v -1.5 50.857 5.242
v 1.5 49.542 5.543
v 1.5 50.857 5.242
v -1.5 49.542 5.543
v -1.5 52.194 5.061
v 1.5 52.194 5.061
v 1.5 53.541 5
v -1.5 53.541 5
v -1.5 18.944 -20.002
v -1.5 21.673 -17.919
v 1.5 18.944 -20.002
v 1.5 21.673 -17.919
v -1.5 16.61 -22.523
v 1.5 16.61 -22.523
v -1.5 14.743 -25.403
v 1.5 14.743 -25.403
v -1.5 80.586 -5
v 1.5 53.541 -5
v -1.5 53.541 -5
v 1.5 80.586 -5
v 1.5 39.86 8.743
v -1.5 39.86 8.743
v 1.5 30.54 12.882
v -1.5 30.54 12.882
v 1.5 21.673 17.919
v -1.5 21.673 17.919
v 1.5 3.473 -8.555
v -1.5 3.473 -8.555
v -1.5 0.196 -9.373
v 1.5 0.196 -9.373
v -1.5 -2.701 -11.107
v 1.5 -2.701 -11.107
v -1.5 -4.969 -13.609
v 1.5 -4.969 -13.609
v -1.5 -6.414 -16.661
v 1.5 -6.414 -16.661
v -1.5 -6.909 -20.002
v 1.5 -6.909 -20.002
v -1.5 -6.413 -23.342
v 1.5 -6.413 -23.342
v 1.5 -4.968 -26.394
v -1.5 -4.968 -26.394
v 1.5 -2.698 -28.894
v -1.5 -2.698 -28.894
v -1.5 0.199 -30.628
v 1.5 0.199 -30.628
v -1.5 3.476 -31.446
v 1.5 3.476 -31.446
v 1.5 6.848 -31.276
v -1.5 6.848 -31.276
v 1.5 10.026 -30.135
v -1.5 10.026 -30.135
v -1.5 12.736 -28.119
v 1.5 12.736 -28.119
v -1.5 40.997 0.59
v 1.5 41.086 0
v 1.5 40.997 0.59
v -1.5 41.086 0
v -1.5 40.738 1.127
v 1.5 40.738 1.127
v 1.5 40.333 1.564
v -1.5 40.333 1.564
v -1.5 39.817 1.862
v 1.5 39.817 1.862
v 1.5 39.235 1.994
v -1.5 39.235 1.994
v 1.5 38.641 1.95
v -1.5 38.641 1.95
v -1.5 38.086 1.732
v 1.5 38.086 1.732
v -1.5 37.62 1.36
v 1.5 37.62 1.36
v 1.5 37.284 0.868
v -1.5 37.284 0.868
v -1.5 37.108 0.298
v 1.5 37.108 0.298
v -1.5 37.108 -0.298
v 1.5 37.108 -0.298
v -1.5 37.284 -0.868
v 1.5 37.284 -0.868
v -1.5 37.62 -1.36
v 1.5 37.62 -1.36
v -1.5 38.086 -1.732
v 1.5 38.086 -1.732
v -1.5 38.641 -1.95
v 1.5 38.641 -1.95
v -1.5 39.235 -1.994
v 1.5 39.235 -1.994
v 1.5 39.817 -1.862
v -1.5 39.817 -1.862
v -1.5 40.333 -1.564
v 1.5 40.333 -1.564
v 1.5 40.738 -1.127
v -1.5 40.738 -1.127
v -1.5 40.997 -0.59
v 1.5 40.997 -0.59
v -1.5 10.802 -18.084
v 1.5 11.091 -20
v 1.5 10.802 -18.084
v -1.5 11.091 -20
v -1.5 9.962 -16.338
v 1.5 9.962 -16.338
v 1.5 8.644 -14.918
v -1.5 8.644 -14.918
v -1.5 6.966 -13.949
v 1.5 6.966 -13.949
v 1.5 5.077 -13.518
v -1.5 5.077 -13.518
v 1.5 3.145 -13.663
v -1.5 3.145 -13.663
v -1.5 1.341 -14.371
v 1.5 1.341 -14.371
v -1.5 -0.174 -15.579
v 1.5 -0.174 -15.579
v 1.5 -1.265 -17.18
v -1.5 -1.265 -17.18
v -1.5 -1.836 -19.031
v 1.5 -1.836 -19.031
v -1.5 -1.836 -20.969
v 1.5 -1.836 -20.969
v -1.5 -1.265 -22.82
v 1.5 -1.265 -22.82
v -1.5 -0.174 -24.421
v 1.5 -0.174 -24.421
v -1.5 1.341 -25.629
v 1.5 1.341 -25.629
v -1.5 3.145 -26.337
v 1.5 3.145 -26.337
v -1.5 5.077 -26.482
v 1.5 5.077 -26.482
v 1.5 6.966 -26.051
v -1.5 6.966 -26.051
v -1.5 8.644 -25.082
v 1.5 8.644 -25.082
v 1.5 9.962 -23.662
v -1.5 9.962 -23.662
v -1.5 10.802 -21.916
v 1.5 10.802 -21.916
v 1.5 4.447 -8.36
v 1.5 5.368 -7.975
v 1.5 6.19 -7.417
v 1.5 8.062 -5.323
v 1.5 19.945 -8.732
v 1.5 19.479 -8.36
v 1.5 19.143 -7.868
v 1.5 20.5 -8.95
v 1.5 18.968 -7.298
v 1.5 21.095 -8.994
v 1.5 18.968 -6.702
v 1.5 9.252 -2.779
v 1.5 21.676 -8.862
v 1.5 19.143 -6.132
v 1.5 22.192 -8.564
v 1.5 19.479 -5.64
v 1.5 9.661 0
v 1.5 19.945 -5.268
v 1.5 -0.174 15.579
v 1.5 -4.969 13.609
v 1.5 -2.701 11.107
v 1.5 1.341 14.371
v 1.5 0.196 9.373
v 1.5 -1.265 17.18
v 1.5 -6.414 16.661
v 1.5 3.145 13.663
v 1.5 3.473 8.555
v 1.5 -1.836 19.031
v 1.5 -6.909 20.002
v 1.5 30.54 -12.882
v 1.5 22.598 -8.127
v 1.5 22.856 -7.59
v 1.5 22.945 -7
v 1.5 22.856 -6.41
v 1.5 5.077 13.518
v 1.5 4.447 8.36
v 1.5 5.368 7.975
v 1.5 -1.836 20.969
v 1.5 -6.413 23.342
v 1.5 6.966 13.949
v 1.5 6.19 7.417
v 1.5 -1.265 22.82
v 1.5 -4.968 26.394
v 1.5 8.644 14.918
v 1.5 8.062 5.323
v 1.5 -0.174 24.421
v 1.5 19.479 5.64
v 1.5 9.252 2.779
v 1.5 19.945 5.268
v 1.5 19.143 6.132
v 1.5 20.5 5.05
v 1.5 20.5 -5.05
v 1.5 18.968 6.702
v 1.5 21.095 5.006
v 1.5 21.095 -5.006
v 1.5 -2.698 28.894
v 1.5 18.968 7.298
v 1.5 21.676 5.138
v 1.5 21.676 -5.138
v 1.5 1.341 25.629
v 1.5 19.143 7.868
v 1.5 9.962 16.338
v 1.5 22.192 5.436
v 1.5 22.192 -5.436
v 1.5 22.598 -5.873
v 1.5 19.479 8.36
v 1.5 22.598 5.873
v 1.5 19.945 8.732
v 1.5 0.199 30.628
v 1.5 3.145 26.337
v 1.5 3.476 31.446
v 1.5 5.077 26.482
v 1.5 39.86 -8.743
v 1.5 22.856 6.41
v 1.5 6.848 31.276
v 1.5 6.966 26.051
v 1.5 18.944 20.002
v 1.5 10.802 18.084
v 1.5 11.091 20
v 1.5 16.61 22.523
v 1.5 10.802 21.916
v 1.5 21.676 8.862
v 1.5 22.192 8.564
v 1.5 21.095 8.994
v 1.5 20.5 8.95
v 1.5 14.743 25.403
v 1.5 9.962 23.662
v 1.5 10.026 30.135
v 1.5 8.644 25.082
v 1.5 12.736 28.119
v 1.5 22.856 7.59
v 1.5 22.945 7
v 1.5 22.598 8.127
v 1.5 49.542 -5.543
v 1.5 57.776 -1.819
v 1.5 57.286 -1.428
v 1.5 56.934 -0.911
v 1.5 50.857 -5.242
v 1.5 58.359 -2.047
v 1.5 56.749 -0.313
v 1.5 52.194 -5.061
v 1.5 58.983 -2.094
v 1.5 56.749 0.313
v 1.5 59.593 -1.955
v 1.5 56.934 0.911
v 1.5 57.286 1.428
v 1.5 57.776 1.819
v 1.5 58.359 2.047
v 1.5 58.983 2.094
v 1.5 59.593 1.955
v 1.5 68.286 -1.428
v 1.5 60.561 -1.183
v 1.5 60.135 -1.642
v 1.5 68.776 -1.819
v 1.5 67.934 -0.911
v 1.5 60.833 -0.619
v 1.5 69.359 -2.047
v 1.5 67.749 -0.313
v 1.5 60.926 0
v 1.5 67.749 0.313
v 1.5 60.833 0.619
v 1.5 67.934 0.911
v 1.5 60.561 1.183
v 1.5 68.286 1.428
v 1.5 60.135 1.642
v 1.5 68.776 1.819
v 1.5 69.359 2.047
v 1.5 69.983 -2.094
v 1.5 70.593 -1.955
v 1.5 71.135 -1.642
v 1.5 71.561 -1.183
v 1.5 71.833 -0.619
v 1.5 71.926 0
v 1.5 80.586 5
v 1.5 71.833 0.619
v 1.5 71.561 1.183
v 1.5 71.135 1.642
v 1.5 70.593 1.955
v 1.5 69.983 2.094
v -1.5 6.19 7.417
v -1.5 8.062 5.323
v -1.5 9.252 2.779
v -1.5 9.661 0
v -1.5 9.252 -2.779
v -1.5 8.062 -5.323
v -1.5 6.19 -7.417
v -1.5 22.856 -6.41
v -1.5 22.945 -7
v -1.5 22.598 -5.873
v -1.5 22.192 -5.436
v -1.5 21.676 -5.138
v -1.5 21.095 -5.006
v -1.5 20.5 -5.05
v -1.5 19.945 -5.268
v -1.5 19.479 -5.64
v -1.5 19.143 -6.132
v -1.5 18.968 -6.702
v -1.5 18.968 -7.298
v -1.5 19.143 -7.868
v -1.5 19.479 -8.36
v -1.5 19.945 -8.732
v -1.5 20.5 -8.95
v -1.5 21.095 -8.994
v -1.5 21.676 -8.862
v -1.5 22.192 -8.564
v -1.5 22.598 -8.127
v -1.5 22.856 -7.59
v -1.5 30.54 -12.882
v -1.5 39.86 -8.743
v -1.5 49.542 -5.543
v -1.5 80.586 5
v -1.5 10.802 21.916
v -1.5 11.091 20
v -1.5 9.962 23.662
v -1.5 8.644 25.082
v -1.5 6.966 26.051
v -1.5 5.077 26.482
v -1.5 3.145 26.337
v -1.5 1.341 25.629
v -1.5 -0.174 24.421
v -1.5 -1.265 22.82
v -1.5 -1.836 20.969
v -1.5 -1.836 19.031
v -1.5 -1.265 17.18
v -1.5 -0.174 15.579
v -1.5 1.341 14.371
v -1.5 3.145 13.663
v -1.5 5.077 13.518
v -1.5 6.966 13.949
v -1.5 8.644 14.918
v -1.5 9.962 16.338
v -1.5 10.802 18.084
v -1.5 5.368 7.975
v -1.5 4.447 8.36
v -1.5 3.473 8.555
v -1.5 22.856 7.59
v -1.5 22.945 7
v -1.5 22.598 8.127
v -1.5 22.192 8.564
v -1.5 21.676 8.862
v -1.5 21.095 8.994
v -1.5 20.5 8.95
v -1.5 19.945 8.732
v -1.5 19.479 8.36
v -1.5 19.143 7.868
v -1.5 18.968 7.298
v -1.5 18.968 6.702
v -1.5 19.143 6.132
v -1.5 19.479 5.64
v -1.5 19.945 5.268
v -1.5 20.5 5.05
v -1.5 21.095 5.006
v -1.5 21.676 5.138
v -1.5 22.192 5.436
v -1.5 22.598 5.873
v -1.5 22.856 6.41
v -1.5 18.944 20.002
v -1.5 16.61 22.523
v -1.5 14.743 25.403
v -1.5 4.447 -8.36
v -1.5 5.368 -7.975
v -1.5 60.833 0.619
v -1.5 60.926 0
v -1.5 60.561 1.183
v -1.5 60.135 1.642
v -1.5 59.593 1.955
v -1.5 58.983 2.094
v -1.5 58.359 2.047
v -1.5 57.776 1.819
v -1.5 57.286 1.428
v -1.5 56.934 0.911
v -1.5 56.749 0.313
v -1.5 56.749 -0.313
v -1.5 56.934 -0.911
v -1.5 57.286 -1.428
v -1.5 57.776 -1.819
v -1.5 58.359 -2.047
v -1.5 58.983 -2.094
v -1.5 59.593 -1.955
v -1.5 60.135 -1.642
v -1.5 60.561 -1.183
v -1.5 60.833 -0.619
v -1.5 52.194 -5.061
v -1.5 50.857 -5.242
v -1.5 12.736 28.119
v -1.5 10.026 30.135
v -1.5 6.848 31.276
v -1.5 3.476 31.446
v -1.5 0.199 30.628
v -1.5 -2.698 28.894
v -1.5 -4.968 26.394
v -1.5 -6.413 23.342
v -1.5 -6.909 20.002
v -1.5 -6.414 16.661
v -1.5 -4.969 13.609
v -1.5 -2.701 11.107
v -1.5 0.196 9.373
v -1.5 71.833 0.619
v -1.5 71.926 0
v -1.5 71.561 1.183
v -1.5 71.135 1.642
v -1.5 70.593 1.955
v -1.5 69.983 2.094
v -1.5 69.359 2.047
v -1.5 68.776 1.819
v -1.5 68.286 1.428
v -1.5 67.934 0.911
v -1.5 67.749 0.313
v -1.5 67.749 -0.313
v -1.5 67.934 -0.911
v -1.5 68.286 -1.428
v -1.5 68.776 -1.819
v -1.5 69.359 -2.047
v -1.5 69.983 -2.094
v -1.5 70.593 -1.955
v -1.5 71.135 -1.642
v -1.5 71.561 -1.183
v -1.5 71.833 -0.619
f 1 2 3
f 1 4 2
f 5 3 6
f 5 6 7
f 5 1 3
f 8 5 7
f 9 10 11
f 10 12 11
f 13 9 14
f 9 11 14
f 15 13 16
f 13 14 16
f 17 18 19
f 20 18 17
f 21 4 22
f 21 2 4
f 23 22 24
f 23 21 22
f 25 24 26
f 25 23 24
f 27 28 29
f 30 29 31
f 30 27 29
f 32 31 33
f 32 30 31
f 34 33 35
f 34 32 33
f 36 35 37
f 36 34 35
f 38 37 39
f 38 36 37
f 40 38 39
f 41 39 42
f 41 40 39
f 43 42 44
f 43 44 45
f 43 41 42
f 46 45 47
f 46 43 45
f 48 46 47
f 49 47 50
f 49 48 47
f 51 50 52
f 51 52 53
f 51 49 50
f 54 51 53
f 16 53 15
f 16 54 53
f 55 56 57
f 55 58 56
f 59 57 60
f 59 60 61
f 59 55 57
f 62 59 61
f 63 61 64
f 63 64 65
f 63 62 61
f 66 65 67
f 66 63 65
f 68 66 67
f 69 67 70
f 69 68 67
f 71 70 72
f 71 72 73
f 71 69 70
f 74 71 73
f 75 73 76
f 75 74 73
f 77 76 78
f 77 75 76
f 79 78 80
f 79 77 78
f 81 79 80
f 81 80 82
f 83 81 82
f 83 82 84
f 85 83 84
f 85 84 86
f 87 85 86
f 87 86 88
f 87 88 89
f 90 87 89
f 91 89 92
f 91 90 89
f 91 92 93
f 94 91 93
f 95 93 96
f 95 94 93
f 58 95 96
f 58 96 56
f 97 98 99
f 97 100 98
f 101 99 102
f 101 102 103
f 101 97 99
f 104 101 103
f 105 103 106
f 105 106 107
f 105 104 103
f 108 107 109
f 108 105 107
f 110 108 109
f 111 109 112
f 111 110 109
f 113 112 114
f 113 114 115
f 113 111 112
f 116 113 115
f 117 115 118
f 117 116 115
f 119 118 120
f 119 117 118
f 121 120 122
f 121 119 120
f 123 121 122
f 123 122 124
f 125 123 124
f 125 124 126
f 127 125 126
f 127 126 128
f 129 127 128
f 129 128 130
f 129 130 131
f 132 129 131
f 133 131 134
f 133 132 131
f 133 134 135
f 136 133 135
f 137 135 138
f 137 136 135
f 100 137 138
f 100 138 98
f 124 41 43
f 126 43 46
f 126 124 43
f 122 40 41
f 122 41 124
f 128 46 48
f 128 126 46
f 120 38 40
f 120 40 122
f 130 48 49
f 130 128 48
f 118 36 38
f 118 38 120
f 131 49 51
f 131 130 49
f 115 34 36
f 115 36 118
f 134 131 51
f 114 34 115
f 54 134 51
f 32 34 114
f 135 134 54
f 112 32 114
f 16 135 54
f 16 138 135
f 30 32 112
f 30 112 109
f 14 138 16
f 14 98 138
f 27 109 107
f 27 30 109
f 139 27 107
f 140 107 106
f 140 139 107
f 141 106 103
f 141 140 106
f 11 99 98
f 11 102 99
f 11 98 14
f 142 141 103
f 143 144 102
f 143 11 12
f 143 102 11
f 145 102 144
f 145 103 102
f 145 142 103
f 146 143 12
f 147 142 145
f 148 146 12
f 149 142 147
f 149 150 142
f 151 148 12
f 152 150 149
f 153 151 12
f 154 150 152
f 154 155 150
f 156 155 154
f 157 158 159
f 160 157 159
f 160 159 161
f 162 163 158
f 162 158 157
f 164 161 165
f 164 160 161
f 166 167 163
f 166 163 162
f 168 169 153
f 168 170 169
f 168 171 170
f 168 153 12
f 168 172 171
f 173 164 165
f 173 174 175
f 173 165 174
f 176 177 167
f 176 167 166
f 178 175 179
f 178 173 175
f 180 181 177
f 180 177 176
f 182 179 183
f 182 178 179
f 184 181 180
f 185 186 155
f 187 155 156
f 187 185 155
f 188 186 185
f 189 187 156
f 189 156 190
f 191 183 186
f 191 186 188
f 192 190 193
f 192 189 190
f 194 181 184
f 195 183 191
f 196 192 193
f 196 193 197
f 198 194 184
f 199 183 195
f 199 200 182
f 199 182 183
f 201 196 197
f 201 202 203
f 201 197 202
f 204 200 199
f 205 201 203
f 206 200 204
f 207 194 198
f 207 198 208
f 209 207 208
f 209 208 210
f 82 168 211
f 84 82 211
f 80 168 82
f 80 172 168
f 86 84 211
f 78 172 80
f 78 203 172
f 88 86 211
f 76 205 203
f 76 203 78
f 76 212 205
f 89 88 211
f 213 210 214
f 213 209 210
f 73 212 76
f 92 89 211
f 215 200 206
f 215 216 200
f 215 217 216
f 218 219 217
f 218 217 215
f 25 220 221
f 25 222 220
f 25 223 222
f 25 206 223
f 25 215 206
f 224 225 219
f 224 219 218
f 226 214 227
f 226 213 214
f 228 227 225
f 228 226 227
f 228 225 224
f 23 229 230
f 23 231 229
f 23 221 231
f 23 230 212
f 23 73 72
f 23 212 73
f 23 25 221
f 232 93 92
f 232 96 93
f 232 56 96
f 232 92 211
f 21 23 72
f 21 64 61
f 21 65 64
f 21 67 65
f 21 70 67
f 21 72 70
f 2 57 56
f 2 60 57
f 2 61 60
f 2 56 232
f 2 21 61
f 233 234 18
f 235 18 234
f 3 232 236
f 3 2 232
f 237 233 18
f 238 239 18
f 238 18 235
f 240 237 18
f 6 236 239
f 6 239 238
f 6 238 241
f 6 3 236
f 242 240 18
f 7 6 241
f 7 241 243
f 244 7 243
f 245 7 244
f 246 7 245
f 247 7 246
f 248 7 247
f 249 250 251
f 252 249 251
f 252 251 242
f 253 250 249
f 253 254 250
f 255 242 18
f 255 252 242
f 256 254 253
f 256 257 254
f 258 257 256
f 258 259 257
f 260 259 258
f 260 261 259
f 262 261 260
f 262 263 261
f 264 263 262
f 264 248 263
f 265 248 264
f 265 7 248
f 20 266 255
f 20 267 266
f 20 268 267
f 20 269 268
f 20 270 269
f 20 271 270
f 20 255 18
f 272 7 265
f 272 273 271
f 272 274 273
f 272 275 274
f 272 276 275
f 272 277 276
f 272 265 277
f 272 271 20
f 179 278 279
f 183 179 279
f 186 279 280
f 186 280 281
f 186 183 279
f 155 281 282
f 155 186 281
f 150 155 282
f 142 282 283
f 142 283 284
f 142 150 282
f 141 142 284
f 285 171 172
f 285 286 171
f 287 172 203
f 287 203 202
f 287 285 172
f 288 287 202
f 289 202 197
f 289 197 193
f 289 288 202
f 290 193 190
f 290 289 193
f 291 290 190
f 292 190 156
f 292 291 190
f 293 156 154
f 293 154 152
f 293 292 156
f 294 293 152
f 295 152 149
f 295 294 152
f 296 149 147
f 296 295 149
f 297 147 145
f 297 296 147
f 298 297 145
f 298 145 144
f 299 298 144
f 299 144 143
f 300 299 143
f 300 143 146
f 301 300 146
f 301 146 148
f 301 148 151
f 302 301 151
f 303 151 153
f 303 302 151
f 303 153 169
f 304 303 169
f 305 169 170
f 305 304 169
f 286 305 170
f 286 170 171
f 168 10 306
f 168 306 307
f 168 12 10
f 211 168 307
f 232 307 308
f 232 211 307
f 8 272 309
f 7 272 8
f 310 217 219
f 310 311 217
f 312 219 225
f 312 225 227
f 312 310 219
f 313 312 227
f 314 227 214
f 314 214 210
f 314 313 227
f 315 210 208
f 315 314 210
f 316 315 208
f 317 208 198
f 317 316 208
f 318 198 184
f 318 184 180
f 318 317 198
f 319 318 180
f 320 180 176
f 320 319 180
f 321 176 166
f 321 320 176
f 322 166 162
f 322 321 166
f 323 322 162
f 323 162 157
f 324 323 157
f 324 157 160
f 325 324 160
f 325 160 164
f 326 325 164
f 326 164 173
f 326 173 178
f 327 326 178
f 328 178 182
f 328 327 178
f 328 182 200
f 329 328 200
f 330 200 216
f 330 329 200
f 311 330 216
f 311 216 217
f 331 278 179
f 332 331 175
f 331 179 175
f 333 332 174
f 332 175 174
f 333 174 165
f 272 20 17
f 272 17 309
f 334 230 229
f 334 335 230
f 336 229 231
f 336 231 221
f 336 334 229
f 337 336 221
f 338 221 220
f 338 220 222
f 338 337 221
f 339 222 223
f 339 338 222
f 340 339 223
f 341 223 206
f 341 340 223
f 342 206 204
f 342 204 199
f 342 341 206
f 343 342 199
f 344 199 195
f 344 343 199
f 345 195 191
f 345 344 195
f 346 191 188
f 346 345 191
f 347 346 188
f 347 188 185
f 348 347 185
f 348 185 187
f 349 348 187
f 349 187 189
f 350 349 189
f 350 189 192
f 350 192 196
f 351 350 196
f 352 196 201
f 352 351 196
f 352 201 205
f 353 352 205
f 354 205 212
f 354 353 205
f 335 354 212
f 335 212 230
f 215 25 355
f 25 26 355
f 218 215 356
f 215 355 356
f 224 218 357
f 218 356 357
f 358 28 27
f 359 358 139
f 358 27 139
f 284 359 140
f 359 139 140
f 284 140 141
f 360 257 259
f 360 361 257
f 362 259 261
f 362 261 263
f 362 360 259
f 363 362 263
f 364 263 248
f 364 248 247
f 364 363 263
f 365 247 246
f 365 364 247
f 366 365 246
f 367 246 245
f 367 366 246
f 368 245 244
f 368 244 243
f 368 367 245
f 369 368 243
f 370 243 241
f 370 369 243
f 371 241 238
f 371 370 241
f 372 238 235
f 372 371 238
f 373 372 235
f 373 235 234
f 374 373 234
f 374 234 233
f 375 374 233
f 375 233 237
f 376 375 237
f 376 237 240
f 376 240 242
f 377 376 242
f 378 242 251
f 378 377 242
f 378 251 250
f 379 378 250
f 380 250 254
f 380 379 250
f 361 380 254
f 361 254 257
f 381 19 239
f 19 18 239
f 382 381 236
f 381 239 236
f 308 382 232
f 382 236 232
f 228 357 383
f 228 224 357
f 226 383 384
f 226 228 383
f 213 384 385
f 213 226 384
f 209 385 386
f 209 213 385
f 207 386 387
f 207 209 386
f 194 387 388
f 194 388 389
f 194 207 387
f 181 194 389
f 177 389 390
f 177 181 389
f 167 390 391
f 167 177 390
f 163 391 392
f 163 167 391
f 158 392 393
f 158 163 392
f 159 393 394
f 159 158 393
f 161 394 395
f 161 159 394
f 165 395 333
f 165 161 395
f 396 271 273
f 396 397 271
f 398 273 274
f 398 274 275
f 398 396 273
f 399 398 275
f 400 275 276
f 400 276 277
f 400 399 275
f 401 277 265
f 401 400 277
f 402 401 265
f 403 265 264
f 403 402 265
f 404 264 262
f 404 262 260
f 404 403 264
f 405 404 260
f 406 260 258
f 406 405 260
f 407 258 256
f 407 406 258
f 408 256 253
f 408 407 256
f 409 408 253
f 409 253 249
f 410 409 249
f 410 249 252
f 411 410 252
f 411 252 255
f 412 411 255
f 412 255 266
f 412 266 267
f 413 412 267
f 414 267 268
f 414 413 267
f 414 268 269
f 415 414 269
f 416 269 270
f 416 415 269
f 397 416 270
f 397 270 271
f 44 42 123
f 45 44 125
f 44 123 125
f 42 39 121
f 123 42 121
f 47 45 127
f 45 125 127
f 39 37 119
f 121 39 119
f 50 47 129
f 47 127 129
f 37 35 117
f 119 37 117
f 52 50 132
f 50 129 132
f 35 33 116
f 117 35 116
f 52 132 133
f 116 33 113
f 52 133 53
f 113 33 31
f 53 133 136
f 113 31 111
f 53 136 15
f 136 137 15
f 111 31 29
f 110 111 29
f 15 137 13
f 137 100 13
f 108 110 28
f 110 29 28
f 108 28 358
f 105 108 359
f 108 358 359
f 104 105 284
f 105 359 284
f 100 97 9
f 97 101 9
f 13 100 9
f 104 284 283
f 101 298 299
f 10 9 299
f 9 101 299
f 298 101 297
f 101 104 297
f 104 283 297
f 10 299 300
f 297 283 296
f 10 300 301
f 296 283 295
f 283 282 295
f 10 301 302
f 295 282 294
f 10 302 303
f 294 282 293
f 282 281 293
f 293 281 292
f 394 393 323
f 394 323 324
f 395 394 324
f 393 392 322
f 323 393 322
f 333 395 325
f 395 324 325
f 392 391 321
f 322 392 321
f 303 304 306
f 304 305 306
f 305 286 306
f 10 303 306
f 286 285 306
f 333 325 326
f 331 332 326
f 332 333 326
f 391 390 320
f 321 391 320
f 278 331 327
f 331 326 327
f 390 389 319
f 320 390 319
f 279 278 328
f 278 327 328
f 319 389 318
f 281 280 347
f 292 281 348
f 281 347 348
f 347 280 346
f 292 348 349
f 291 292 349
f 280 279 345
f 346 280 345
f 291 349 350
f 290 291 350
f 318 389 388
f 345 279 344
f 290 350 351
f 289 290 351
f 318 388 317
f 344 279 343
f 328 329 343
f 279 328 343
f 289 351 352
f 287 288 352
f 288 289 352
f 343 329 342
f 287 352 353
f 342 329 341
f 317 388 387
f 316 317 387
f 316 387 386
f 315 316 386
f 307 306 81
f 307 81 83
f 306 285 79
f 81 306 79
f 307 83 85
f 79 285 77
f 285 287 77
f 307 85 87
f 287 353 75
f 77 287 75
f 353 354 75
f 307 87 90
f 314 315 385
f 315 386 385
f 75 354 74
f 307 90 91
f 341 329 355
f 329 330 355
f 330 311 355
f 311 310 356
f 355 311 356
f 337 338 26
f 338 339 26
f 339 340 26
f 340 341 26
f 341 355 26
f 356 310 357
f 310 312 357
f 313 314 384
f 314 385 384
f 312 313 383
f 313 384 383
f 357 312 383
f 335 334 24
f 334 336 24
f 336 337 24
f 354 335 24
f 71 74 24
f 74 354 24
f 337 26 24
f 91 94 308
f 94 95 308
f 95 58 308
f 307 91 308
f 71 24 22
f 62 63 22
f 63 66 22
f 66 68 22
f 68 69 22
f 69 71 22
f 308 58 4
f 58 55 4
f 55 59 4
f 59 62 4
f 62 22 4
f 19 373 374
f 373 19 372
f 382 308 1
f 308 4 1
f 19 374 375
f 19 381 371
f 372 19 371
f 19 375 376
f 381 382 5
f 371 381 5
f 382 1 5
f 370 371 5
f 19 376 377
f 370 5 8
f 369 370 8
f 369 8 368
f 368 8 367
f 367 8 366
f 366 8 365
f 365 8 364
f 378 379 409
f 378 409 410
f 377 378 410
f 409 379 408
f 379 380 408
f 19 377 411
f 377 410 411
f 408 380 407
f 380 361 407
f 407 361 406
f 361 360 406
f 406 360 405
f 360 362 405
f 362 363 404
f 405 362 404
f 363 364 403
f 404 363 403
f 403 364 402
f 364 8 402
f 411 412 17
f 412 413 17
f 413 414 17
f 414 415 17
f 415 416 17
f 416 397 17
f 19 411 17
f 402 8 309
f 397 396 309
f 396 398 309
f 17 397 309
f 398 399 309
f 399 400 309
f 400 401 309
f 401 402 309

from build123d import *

# Parameters (mm, degrees)
F0_R     = 6.5
F0_R_2   = 2
F0_R_3   = 2.1
F1_DEPTH = 1.5
F2_R     = 15
F3_R     = 20
F4_R     = 5


with BuildPart() as f1:
    # F0 (on Right) → F1 (new body, symmetric)
    with BuildSketch(Plane.YZ):
        with BuildLine():
            ThreePointArc((15.9438017453, 21.8347446946), (10.092966313, 26.4624215835), (4.5911055058, 31.5))
            ThreePointArc((4.5911055058, 31.5), (-6.9088944942, 20), (4.5911055058, 8.5))
            ThreePointArc((4.5911055058, 8.5), (12.7228334895, 11.8682720164), (16.0911055058, 20))
            ThreePointArc((16.0911055058, 20), (16.0542204131, 20.9203241946), (15.9438017453, 21.8347446946))
        make_face()
        with Locations((4.5911055058, 20)):
            Circle(F0_R, mode=Mode.SUBTRACT)
        with BuildLine():
            ThreePointArc((15.9438017453, 21.8347446946), (12.0459843114, 28.7564137633), (4.5911055058, 31.5))
            ThreePointArc((4.5911055058, 31.5), (10.092966313, 26.4624215835), (15.9438017453, 21.8347446946))
        make_face()
        with BuildLine():
            ThreePointArc((16.0911055058, 20), (12.7228334895, 11.8682720164), (4.5911055058, 8.5))
            ThreePointArc((4.5911055058, 8.5), (9.6606547276, 0), (4.5911055058, -8.5))
            ThreePointArc((4.5911055058, -8.5), (12.7228334895, -11.8682720164), (16.0911055058, -20))
            ThreePointArc((16.0911055058, -20), (16.0542204131, -20.9203241946), (15.9438017453, -21.8347446946))
            ThreePointArc((15.9438017453, -21.8347446946), (32.9549775317, -11.7027354234), (51.585894078, -5))
            Line((51.585894078, -5), (80.585894078, -5))
            Line((80.585894078, -5), (80.585894078, 5))
            Line((80.585894078, 5), (51.585894078, 5))
            ThreePointArc((51.585894078, 5), (32.9549775317, 11.7027354234), (15.9438017453, 21.8347446946))
            ThreePointArc((15.9438017453, 21.8347446946), (16.0542204131, 20.9203241946), (16.0911055058, 20))
        make_face()
        with Locations((20.9452081472, -7)):
            Circle(F0_R_2, mode=Mode.SUBTRACT)
        with Locations((20.9452081472, 7)):
            Circle(F0_R_2, mode=Mode.SUBTRACT)
        with Locations((39.085894078, 0)):
            Circle(F0_R_2, mode=Mode.SUBTRACT)
        with Locations((58.825894078, 0)):
            Circle(F0_R_3, mode=Mode.SUBTRACT)
        with Locations((69.825894078, 0)):
            Circle(F0_R_3, mode=Mode.SUBTRACT)
        with BuildLine():
            ThreePointArc((16.0911055058, -20), (12.7228334895, -11.8682720164), (4.5911055058, -8.5))
            ThreePointArc((4.5911055058, -8.5), (-6.9088944942, -20), (4.5911055058, -31.5))
            ThreePointArc((4.5911055058, -31.5), (10.092966313, -26.4624215835), (15.9438017453, -21.8347446946))
            ThreePointArc((15.9438017453, -21.8347446946), (16.0542204131, -20.9203241946), (16.0911055058, -20))
        make_face()
        with Locations((4.5911055058, -20)):
            Circle(F0_R, mode=Mode.SUBTRACT)
        with BuildLine():
            ThreePointArc((15.9438017453, -21.8347446946), (10.092966313, -26.4624215835), (4.5911055058, -31.5))
            ThreePointArc((4.5911055058, -31.5), (12.0459843114, -28.7564137633), (15.9438017453, -21.8347446946))
        make_face()
    extrude(amount=F1_DEPTH, both=True)

    # F2
    f2_edges = [f1.edges().sort_by_distance(p)[0] for p in [
        (0, 51.585894, -5),
        (0, 51.585894, 5),
    ]]
    fillet(f2_edges, radius=F2_R)

    # F3
    f3_edges = [f1.edges().sort_by_distance(p)[0] for p in [
        (0, 15.943802, -21.834745),
        (0, 15.943802, 21.834745),
    ]]
    fillet(f3_edges, radius=F3_R)

    # F4
    f4_edges = [f1.edges().sort_by_distance(p)[0] for p in [
        (0, 4.591106, 8.5),
        (0, 4.591106, -8.5),
    ]]
    fillet(f4_edges, radius=F4_R)


solid = f1.part
